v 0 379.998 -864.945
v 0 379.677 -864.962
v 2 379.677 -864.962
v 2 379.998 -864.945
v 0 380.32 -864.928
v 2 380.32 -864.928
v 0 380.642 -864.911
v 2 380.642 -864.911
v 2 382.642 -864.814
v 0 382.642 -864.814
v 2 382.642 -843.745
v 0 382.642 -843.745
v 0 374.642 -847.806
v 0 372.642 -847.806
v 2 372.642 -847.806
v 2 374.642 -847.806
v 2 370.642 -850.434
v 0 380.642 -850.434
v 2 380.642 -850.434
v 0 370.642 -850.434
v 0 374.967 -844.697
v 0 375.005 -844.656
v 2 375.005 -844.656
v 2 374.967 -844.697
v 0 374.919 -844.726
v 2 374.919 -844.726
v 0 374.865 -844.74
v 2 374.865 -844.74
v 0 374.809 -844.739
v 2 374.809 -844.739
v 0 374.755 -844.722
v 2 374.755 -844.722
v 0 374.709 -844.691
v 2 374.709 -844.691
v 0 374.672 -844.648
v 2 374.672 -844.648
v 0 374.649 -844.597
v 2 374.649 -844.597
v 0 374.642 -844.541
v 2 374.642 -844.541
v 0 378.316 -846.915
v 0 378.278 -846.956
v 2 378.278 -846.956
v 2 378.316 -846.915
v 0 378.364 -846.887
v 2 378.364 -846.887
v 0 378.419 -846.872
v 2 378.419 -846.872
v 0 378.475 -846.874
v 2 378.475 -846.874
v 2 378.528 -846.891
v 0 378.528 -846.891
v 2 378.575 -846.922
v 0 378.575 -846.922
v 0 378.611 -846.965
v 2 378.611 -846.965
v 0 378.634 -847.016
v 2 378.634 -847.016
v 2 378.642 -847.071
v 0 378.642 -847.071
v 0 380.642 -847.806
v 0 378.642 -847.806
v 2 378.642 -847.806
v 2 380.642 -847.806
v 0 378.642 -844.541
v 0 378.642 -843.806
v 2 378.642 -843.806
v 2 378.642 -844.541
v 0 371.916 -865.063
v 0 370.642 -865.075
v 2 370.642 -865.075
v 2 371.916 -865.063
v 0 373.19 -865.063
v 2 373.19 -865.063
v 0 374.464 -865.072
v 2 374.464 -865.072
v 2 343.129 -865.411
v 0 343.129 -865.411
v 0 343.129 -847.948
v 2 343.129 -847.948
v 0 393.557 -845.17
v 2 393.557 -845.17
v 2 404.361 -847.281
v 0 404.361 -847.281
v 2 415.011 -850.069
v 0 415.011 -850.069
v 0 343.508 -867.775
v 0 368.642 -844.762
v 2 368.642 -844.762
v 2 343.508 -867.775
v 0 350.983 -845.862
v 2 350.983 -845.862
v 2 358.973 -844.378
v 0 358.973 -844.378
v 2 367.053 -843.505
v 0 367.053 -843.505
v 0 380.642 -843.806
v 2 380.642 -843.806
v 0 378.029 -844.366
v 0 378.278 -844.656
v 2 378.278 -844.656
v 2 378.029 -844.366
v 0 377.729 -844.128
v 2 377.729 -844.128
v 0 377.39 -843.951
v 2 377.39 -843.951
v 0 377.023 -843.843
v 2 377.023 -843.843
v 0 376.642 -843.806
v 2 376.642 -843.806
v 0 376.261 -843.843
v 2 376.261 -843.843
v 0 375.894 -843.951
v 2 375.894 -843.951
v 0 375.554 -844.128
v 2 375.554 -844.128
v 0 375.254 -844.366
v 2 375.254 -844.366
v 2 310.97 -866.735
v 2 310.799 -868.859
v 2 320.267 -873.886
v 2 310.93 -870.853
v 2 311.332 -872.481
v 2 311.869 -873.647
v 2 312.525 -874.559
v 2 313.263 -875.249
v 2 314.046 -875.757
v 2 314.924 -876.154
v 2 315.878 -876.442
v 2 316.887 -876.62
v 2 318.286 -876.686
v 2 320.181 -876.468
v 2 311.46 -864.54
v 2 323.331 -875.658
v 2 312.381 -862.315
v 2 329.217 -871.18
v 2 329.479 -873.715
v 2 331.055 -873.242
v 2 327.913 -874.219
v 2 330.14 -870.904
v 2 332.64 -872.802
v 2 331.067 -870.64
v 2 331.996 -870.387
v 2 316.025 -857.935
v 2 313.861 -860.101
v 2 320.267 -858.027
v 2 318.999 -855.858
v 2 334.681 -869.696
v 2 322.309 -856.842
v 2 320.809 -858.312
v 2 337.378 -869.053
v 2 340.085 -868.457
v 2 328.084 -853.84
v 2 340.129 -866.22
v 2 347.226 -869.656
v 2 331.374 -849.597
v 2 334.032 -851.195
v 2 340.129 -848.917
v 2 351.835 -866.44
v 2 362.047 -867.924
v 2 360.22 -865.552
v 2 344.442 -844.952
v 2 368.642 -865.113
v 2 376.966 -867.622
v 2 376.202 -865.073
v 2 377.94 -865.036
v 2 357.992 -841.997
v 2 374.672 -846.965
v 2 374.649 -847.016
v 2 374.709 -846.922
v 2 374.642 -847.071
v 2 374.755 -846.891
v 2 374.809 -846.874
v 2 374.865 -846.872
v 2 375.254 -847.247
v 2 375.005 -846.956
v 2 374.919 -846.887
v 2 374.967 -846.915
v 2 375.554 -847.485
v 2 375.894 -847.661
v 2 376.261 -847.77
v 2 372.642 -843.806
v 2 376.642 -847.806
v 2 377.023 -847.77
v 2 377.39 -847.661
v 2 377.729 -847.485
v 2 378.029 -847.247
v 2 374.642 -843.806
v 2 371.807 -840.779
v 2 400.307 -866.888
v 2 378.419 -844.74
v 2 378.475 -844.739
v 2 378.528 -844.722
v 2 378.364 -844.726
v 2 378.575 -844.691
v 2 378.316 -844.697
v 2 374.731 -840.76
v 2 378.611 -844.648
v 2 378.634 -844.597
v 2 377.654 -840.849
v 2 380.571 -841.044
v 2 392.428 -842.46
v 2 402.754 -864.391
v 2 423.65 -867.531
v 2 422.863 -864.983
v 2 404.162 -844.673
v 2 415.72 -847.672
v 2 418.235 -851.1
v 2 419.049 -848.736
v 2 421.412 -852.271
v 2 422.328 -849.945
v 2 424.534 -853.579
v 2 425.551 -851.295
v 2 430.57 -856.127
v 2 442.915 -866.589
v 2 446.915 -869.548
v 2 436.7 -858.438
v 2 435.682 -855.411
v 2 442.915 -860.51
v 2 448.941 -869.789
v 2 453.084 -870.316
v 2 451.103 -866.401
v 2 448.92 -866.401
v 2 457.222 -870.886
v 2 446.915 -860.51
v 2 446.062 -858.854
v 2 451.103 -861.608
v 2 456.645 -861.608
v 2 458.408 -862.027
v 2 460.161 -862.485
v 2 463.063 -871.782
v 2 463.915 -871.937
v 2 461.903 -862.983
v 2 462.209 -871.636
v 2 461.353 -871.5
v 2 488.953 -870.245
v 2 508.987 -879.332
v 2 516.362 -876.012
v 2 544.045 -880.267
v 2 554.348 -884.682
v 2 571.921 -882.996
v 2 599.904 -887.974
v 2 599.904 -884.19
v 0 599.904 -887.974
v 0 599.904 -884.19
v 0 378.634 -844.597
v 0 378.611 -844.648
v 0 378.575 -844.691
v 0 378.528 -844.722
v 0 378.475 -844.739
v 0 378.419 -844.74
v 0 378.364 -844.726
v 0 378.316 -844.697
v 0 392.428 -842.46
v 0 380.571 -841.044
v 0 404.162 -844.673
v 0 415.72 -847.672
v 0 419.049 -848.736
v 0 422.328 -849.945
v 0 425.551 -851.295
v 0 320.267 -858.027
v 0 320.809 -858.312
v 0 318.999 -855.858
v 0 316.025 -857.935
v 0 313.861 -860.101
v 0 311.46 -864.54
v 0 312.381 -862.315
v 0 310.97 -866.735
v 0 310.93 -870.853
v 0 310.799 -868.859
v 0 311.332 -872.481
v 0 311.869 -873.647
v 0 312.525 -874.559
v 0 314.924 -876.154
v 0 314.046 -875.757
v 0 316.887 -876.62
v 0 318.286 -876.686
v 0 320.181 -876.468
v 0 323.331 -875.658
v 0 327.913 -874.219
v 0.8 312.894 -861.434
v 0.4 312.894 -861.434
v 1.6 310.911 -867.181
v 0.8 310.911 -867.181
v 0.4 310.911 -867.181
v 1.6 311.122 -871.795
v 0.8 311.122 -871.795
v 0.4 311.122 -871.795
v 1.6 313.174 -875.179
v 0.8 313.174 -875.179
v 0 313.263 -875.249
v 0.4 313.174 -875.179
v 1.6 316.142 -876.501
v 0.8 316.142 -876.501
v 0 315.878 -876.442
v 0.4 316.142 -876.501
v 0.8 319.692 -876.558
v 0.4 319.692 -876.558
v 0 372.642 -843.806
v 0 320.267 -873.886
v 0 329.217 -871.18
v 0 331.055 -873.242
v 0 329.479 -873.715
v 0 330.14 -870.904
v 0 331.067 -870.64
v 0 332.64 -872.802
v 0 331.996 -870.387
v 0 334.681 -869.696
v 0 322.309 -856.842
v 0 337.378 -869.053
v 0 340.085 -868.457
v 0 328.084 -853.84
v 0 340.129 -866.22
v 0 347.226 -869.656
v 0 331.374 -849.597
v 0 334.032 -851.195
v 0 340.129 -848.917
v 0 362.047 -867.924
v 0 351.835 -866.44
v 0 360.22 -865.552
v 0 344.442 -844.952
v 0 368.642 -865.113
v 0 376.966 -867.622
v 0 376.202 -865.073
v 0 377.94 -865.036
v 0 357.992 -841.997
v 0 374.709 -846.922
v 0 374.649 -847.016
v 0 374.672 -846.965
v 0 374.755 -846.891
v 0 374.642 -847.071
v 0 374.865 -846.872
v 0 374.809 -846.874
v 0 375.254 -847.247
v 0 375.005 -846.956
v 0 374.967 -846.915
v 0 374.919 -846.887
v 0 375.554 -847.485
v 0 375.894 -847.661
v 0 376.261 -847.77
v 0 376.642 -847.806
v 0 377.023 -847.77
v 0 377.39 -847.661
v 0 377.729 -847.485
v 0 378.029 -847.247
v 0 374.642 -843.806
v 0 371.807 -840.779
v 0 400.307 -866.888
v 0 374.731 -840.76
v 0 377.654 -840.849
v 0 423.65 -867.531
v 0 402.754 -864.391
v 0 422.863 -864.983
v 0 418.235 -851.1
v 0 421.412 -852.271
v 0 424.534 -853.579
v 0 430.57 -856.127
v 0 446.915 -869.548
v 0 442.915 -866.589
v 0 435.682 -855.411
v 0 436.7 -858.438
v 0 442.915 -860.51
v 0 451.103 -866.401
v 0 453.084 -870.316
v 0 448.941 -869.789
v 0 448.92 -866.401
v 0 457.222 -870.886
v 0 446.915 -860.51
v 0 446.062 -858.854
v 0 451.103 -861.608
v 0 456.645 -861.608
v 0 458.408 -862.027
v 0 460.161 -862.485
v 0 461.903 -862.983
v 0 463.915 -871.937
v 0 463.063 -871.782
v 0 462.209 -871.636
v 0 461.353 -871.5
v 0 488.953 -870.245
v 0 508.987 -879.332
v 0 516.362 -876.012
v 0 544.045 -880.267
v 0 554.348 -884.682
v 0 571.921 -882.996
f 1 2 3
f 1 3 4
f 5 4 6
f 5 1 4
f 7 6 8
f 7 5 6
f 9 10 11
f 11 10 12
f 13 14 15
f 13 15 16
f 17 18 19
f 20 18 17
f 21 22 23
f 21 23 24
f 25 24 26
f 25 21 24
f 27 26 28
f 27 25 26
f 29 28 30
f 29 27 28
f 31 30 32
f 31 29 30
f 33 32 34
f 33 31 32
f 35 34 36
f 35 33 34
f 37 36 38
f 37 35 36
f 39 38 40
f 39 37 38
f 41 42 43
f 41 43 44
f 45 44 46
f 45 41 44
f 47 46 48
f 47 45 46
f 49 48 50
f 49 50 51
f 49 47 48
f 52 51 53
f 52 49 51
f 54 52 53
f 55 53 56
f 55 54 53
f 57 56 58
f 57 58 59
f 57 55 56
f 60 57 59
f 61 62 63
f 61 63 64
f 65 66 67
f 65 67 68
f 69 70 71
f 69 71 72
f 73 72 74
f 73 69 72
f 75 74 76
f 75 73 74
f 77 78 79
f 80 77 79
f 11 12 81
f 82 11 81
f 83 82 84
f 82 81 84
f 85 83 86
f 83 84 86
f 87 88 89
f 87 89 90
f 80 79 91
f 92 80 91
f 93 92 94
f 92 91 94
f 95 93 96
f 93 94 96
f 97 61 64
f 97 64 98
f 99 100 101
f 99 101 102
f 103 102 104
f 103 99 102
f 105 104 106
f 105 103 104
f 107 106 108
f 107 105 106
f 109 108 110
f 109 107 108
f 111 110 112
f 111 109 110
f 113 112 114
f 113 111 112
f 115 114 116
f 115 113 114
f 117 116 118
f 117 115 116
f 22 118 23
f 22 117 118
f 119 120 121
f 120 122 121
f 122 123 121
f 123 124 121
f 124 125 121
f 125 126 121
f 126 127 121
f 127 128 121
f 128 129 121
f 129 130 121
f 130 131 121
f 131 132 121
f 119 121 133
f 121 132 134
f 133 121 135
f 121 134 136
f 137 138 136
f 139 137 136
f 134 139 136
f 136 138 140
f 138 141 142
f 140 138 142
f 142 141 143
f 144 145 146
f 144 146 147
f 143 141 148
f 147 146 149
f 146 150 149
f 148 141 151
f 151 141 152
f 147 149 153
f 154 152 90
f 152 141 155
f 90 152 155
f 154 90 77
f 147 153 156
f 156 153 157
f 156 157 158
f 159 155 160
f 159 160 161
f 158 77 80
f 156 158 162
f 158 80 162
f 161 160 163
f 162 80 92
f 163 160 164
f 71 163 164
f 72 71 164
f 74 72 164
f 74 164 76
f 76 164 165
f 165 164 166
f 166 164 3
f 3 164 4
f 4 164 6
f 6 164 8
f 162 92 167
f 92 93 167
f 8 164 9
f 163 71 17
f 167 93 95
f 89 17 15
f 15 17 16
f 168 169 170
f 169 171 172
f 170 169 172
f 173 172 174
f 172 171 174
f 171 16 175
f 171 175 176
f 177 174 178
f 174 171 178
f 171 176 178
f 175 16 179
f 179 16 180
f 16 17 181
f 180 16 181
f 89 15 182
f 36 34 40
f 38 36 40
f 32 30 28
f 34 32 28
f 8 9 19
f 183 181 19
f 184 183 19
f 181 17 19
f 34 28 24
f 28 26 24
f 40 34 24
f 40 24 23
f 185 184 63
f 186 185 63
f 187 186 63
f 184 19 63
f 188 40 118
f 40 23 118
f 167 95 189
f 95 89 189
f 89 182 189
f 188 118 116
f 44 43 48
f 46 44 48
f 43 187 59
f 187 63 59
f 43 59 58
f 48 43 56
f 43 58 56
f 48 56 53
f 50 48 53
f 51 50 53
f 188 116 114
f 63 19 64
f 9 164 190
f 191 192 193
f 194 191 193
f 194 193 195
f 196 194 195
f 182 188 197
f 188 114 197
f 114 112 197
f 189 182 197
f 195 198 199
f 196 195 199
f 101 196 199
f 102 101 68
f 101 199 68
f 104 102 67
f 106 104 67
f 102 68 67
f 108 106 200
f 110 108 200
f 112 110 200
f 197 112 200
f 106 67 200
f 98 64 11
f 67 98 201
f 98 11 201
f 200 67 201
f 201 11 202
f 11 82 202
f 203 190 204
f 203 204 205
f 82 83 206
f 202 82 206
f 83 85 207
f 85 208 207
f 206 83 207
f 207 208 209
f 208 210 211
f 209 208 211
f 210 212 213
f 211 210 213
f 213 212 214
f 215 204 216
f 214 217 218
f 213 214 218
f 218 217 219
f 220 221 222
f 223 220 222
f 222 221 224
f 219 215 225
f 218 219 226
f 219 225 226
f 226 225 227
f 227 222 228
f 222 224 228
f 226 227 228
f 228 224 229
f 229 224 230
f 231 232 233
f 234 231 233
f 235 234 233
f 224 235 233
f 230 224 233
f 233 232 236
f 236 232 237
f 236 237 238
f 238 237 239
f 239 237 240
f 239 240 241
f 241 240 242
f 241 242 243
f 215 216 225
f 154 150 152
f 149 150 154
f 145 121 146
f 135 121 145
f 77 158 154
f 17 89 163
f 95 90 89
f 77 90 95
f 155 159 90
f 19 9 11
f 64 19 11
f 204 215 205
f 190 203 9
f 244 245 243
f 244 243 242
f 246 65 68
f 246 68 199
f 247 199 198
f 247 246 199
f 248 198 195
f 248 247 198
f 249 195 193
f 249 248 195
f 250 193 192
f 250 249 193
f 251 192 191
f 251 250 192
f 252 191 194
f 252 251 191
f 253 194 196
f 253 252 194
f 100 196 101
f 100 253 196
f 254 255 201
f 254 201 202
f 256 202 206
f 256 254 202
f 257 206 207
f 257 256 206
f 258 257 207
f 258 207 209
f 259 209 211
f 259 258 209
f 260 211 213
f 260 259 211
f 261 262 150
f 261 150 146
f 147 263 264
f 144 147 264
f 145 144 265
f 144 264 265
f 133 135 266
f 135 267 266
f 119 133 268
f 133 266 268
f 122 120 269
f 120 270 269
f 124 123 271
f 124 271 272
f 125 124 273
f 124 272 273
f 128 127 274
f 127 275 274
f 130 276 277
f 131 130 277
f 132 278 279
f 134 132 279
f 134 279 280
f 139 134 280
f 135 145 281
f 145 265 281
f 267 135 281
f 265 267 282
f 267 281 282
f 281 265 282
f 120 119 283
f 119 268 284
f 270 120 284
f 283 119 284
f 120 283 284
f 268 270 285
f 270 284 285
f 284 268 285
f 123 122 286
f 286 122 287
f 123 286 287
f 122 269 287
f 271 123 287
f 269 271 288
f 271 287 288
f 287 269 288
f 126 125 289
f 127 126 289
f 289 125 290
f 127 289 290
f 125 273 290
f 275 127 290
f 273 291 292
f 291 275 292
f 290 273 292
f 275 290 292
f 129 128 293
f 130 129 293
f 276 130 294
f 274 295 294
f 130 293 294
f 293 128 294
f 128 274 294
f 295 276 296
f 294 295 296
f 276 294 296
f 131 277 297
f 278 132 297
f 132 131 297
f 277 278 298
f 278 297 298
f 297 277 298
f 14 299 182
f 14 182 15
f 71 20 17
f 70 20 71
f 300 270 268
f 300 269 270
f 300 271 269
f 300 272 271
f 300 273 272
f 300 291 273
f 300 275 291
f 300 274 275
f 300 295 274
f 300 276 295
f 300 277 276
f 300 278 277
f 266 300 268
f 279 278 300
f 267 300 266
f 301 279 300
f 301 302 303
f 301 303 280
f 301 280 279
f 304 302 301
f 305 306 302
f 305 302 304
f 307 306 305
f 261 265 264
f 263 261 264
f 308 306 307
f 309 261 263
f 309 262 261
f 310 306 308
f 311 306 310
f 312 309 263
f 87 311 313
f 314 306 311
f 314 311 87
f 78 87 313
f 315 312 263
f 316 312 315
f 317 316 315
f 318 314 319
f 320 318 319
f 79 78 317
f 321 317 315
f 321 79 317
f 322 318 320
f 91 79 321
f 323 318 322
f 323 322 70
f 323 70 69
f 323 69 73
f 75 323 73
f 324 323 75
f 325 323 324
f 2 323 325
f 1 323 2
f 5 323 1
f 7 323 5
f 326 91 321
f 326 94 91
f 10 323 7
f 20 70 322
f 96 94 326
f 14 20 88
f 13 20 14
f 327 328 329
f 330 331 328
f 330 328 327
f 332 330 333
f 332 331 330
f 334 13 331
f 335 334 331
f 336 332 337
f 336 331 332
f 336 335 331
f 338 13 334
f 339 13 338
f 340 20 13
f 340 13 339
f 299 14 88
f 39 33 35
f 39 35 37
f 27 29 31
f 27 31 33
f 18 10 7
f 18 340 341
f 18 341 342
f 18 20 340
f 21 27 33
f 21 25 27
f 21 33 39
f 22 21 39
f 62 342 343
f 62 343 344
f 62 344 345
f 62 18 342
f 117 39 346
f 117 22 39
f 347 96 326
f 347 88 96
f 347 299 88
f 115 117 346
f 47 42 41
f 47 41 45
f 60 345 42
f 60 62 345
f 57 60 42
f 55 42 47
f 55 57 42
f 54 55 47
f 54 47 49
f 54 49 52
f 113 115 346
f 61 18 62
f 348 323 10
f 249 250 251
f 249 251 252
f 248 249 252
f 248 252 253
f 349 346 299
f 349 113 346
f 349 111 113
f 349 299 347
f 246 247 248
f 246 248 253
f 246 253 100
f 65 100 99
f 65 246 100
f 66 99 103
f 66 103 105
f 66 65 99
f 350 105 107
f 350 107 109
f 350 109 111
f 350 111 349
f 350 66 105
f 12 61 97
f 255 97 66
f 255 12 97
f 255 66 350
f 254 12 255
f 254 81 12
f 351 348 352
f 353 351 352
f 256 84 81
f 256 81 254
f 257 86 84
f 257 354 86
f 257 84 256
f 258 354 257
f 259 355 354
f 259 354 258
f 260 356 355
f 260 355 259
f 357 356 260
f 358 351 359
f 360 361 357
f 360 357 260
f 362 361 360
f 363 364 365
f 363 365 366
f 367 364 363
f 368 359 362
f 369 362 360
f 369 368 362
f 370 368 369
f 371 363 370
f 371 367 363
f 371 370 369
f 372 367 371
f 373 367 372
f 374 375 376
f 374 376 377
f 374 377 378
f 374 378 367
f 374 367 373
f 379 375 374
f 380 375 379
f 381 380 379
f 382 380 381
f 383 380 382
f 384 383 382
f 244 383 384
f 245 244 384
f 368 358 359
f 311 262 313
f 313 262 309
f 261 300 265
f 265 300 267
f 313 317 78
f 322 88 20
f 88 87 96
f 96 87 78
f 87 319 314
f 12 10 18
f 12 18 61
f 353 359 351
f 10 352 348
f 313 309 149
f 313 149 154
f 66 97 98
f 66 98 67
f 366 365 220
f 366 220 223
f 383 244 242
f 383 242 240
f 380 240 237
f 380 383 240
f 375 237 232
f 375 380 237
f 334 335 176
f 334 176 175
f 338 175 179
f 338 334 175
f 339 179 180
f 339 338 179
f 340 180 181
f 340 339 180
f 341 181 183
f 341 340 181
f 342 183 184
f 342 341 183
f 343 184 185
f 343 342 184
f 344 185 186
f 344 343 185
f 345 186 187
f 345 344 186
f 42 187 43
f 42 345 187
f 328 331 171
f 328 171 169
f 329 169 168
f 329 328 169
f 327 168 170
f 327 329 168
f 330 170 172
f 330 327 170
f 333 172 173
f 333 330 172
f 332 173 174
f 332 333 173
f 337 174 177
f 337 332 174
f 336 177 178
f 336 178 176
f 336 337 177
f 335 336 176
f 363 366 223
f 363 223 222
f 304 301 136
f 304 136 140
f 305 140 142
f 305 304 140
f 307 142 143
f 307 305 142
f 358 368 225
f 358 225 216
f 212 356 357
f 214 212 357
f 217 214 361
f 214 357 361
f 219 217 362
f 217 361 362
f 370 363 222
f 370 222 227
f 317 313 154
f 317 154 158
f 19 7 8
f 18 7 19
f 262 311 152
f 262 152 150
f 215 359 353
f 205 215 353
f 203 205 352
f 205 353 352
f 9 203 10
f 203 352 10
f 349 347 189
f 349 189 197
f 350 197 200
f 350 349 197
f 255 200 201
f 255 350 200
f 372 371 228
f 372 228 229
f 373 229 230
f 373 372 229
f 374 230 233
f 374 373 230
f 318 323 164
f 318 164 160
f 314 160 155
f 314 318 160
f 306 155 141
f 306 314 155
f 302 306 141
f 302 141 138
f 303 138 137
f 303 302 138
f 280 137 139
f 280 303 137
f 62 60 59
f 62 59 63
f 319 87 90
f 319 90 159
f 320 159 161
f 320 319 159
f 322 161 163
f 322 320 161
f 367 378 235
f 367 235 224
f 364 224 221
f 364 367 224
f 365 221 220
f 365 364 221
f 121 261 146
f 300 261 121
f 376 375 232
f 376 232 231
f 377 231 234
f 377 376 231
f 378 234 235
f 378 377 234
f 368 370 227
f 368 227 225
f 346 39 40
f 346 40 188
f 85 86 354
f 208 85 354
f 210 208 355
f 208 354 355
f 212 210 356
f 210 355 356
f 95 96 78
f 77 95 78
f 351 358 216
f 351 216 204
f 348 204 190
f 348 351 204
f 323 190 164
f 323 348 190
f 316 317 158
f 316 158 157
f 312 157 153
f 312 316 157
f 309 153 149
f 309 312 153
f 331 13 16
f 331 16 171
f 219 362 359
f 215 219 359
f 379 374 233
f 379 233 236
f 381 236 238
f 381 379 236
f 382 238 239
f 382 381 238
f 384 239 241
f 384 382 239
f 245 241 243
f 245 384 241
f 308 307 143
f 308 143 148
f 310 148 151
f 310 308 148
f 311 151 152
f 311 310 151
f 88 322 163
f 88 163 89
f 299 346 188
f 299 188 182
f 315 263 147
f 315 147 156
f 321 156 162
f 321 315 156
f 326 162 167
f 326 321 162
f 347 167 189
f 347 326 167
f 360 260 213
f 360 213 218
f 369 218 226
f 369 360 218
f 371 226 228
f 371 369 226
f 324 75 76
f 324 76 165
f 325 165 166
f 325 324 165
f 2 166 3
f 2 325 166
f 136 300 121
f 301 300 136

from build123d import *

# Parameters (mm, degrees)
BOSS_EXTRUDE3_DEPTH = 2


with BuildPart() as part:
    # rib1 → Boss-Extrude3 (new body)
    with BuildSketch(Plane(origin=(0, 0, 0), x_dir=(0, 0, -1), z_dir=(1, 0, 0))):
        with BuildLine():
            Line((884.190402355, 599.903880086), (887.974497078, 599.903880086))
            ThreePointArc((887.974497078, 599.903880086), (882.263270905, 531.637412846), (871.936760509, 463.915246337))
            ThreePointArc((871.936760509, 463.915246337), (871.707754952, 462.63585681), (871.499564589, 461.352915705))
            ThreePointArc((871.499564589, 461.352915705), (870.595346832, 455.153887164), (869.789272098, 448.9413347))
            Line((869.789272098, 448.9413347), (866.401149721, 448.919807544))
            Line((866.401149721, 448.919807544), (866.401149721, 451.102816327))
            Line((866.401149721, 451.102816327), (861.608127253, 451.102816327))
            Line((861.608127253, 451.102816327), (860.510379387, 446.915494441))
            Line((860.510379387, 446.915494441), (865.375229135, 446.915494441))
            Line((865.375229135, 446.915494441), (869.54798498, 446.915494441))
            ThreePointArc((869.54798498, 446.915494441), (867.037221046, 411.983470834), (867.621553236, 376.966207023))
            ThreePointArc((867.621553236, 376.966207023), (868.612160303, 354.616141956), (872.80220547, 332.640013262))
            ThreePointArc((872.80220547, 332.640013262), (873.47434667, 330.265780469), (874.219390873, 327.913406289))
            add(Edge.make_bspline(
                [(855.857880167, 318.999188197), (859.364761712, 313.05960504), (867.053375546, 309.847722104), (875.890724025, 311.576721792), (877.047226337, 317.875748314), (875.730897291, 323.262688208), (874.992082107, 325.59839708), (874.219390873, 327.913406289)],
                knots=[0, 0, 0, 0, 0.275025565, 0.518183074, 0.708505616, 0.751926805, 0.952394957, 0.952394957, 0.952394957, 0.952394957], degree=3))
            ThreePointArc((855.857880167, 318.999188197), (844.952134323, 344.441967913), (840.778778225, 371.807154391))
            ThreePointArc((840.778778225, 371.807154391), (840.791401867, 376.192855714), (841.044346896, 380.571274865))
            ThreePointArc((841.044346896, 380.571274865), (843.467649147, 398.313507068), (847.671804222, 415.719950629))
            ThreePointArc((847.671804222, 415.719950629), (849.322478828, 420.694724685), (851.295375271, 425.550729544))
            ThreePointArc((851.295375271, 425.550729544), (857.21755567, 440.844099615), (861.608127253, 456.645437216))
            ThreePointArc((861.608127253, 456.645437216), (862.250861952, 459.285693699), (862.982894629, 461.902598426))
            ThreePointArc((862.982894629, 461.902598426), (878.329662766, 530.174351012), (884.190402355, 599.903880086))
        make_face()
        with BuildLine():
            Line((856.934499706, 370.641580619), (865.074501074, 370.641580619))
            ThreePointArc((865.074501074, 370.641580619), (865.061715716, 372.55284998), (865.072069166, 374.464134061))
            ThreePointArc((865.072069166, 374.464134061), (865.059488848, 377.071259141), (864.961961737, 379.676589813))
            ThreePointArc((864.961961737, 379.676589813), (864.936315213, 380.159069851), (864.911253489, 380.641580619))
            Line((864.911253489, 380.641580619), (855.857880167, 380.641580619))
            Line((855.857880167, 380.641580619), (850.434499706, 380.641580619))
            Line((850.434499706, 380.641580619), (850.434499706, 379.641580619))
            Line((850.434499706, 379.641580619), (850.434499706, 376.641580619))
            Line((850.434499706, 376.641580619), (850.434499706, 373.641580619))
            Line((850.434499706, 373.641580619), (850.434499706, 370.641580619))
            Line((850.434499706, 370.641580619), (856.934499706, 370.641580619))
        make_face(mode=Mode.SUBTRACT)
        with BuildLine():
            Line((843.806259463, 374.641580619), (843.806259463, 372.641580619))
            Line((843.806259463, 372.641580619), (847.806259463, 372.641580619))
            Line((847.806259463, 372.641580619), (847.806259463, 374.641580619))
            Line((847.806259463, 374.641580619), (847.071170527, 374.641580619))
            ThreePointArc((847.071170527, 374.641580619), (846.880478009, 374.78127835), (846.956178612, 375.005216983))
            ThreePointArc((846.956178612, 375.005216983), (847.806259463, 376.641580619), (846.956178612, 378.277944256))
            ThreePointArc((846.956178612, 378.277944256), (846.880478009, 378.501882888), (847.071170527, 378.641580619))
            Line((847.071170527, 378.641580619), (847.806259463, 378.641580619))
            Line((847.806259463, 378.641580619), (847.806259463, 380.641580619))
            Line((847.806259463, 380.641580619), (843.806259463, 380.641580619))
            Line((843.806259463, 380.641580619), (843.806259463, 378.641580619))
            Line((843.806259463, 378.641580619), (844.541348398, 378.641580619))
            ThreePointArc((844.541348398, 378.641580619), (844.732040916, 378.501882888), (844.656340313, 378.277944256))
            ThreePointArc((844.656340313, 378.277944256), (843.806259463, 376.641580619), (844.656340313, 375.005216983))
            ThreePointArc((844.656340313, 375.005216983), (844.732040916, 374.78127835), (844.541348398, 374.641580619))
            Line((844.541348398, 374.641580619), (843.806259463, 374.641580619))
        make_face(mode=Mode.SUBTRACT)
        with BuildLine():
            Line((855.857880167, 382.641580619), (843.745202867, 382.641580619))
            ThreePointArc((843.745202867, 382.641580619), (846.140446491, 398.975976663), (850.069113586, 415.010790694))
            ThreePointArc((850.069113586, 415.010790694), (851.66820461, 419.830103061), (853.57944804, 424.534357768))
            ThreePointArc((853.57944804, 424.534357768), (857.311934253, 433.624241307), (860.510379387, 442.915494441))
            Line((860.510379387, 442.915494441), (866.588621263, 442.915494441))
            ThreePointArc((866.588621263, 442.915494441), (864.559820273, 412.812147569), (864.813623932, 382.641580619))
            Line((864.813623932, 382.641580619), (855.857880167, 382.641580619))
        make_face(mode=Mode.SUBTRACT)
        with BuildLine():
            Line((856.934499706, 368.641580619), (844.761871726, 368.641580619))
            Line((844.761871726, 368.641580619), (867.775159476, 343.508235636))
            ThreePointArc((867.775159476, 343.508235636), (865.940167273, 356.021544161), (865.112661127, 368.641580619))
            Line((865.112661127, 368.641580619), (856.934499706, 368.641580619))
        make_face(mode=Mode.SUBTRACT)
        with BuildLine():
            Line((866.220437017, 340.129064892), (848.91695937, 340.129064892))
            ThreePointArc((848.91695937, 340.129064892), (852.472162499, 331.037884456), (856.841512929, 322.308748884))
            Line((856.841512929, 322.308748884), (866.220437017, 340.129064892))
        make_face(mode=Mode.SUBTRACT)
        with BuildLine():
            Line((858.312156349, 320.808777779), (858.026910258, 320.266799251))
            Line((858.026910258, 320.266799251), (873.886224652, 320.266799251))
            Line((873.886224652, 320.266799251), (871.179687831, 329.216724417))
            ThreePointArc((871.179687831, 329.216724417), (870.770932499, 330.602992637), (870.386524281, 331.996208637))
            ThreePointArc((870.386524281, 331.996208637), (869.368691994, 336.027959273), (868.457393024, 340.085117137))
            Line((868.457393024, 340.085117137), (858.312156349, 320.808777779))
        make_face(mode=Mode.SUBTRACT)
        with BuildLine():
            Line((848.420317738, 343.129064892), (847.948092292, 343.129064892))
            ThreePointArc((847.948092292, 343.129064892), (845.043868959, 354.964134396), (843.504907333, 367.052764611))
            Line((843.504907333, 367.052764611), (865.410586264, 343.129064892))
            Line((865.410586264, 343.129064892), (848.420317738, 343.129064892))
        make_face(mode=Mode.SUBTRACT)
    extrude(amount=BOSS_EXTRUDE3_DEPTH)


solid = part.part
